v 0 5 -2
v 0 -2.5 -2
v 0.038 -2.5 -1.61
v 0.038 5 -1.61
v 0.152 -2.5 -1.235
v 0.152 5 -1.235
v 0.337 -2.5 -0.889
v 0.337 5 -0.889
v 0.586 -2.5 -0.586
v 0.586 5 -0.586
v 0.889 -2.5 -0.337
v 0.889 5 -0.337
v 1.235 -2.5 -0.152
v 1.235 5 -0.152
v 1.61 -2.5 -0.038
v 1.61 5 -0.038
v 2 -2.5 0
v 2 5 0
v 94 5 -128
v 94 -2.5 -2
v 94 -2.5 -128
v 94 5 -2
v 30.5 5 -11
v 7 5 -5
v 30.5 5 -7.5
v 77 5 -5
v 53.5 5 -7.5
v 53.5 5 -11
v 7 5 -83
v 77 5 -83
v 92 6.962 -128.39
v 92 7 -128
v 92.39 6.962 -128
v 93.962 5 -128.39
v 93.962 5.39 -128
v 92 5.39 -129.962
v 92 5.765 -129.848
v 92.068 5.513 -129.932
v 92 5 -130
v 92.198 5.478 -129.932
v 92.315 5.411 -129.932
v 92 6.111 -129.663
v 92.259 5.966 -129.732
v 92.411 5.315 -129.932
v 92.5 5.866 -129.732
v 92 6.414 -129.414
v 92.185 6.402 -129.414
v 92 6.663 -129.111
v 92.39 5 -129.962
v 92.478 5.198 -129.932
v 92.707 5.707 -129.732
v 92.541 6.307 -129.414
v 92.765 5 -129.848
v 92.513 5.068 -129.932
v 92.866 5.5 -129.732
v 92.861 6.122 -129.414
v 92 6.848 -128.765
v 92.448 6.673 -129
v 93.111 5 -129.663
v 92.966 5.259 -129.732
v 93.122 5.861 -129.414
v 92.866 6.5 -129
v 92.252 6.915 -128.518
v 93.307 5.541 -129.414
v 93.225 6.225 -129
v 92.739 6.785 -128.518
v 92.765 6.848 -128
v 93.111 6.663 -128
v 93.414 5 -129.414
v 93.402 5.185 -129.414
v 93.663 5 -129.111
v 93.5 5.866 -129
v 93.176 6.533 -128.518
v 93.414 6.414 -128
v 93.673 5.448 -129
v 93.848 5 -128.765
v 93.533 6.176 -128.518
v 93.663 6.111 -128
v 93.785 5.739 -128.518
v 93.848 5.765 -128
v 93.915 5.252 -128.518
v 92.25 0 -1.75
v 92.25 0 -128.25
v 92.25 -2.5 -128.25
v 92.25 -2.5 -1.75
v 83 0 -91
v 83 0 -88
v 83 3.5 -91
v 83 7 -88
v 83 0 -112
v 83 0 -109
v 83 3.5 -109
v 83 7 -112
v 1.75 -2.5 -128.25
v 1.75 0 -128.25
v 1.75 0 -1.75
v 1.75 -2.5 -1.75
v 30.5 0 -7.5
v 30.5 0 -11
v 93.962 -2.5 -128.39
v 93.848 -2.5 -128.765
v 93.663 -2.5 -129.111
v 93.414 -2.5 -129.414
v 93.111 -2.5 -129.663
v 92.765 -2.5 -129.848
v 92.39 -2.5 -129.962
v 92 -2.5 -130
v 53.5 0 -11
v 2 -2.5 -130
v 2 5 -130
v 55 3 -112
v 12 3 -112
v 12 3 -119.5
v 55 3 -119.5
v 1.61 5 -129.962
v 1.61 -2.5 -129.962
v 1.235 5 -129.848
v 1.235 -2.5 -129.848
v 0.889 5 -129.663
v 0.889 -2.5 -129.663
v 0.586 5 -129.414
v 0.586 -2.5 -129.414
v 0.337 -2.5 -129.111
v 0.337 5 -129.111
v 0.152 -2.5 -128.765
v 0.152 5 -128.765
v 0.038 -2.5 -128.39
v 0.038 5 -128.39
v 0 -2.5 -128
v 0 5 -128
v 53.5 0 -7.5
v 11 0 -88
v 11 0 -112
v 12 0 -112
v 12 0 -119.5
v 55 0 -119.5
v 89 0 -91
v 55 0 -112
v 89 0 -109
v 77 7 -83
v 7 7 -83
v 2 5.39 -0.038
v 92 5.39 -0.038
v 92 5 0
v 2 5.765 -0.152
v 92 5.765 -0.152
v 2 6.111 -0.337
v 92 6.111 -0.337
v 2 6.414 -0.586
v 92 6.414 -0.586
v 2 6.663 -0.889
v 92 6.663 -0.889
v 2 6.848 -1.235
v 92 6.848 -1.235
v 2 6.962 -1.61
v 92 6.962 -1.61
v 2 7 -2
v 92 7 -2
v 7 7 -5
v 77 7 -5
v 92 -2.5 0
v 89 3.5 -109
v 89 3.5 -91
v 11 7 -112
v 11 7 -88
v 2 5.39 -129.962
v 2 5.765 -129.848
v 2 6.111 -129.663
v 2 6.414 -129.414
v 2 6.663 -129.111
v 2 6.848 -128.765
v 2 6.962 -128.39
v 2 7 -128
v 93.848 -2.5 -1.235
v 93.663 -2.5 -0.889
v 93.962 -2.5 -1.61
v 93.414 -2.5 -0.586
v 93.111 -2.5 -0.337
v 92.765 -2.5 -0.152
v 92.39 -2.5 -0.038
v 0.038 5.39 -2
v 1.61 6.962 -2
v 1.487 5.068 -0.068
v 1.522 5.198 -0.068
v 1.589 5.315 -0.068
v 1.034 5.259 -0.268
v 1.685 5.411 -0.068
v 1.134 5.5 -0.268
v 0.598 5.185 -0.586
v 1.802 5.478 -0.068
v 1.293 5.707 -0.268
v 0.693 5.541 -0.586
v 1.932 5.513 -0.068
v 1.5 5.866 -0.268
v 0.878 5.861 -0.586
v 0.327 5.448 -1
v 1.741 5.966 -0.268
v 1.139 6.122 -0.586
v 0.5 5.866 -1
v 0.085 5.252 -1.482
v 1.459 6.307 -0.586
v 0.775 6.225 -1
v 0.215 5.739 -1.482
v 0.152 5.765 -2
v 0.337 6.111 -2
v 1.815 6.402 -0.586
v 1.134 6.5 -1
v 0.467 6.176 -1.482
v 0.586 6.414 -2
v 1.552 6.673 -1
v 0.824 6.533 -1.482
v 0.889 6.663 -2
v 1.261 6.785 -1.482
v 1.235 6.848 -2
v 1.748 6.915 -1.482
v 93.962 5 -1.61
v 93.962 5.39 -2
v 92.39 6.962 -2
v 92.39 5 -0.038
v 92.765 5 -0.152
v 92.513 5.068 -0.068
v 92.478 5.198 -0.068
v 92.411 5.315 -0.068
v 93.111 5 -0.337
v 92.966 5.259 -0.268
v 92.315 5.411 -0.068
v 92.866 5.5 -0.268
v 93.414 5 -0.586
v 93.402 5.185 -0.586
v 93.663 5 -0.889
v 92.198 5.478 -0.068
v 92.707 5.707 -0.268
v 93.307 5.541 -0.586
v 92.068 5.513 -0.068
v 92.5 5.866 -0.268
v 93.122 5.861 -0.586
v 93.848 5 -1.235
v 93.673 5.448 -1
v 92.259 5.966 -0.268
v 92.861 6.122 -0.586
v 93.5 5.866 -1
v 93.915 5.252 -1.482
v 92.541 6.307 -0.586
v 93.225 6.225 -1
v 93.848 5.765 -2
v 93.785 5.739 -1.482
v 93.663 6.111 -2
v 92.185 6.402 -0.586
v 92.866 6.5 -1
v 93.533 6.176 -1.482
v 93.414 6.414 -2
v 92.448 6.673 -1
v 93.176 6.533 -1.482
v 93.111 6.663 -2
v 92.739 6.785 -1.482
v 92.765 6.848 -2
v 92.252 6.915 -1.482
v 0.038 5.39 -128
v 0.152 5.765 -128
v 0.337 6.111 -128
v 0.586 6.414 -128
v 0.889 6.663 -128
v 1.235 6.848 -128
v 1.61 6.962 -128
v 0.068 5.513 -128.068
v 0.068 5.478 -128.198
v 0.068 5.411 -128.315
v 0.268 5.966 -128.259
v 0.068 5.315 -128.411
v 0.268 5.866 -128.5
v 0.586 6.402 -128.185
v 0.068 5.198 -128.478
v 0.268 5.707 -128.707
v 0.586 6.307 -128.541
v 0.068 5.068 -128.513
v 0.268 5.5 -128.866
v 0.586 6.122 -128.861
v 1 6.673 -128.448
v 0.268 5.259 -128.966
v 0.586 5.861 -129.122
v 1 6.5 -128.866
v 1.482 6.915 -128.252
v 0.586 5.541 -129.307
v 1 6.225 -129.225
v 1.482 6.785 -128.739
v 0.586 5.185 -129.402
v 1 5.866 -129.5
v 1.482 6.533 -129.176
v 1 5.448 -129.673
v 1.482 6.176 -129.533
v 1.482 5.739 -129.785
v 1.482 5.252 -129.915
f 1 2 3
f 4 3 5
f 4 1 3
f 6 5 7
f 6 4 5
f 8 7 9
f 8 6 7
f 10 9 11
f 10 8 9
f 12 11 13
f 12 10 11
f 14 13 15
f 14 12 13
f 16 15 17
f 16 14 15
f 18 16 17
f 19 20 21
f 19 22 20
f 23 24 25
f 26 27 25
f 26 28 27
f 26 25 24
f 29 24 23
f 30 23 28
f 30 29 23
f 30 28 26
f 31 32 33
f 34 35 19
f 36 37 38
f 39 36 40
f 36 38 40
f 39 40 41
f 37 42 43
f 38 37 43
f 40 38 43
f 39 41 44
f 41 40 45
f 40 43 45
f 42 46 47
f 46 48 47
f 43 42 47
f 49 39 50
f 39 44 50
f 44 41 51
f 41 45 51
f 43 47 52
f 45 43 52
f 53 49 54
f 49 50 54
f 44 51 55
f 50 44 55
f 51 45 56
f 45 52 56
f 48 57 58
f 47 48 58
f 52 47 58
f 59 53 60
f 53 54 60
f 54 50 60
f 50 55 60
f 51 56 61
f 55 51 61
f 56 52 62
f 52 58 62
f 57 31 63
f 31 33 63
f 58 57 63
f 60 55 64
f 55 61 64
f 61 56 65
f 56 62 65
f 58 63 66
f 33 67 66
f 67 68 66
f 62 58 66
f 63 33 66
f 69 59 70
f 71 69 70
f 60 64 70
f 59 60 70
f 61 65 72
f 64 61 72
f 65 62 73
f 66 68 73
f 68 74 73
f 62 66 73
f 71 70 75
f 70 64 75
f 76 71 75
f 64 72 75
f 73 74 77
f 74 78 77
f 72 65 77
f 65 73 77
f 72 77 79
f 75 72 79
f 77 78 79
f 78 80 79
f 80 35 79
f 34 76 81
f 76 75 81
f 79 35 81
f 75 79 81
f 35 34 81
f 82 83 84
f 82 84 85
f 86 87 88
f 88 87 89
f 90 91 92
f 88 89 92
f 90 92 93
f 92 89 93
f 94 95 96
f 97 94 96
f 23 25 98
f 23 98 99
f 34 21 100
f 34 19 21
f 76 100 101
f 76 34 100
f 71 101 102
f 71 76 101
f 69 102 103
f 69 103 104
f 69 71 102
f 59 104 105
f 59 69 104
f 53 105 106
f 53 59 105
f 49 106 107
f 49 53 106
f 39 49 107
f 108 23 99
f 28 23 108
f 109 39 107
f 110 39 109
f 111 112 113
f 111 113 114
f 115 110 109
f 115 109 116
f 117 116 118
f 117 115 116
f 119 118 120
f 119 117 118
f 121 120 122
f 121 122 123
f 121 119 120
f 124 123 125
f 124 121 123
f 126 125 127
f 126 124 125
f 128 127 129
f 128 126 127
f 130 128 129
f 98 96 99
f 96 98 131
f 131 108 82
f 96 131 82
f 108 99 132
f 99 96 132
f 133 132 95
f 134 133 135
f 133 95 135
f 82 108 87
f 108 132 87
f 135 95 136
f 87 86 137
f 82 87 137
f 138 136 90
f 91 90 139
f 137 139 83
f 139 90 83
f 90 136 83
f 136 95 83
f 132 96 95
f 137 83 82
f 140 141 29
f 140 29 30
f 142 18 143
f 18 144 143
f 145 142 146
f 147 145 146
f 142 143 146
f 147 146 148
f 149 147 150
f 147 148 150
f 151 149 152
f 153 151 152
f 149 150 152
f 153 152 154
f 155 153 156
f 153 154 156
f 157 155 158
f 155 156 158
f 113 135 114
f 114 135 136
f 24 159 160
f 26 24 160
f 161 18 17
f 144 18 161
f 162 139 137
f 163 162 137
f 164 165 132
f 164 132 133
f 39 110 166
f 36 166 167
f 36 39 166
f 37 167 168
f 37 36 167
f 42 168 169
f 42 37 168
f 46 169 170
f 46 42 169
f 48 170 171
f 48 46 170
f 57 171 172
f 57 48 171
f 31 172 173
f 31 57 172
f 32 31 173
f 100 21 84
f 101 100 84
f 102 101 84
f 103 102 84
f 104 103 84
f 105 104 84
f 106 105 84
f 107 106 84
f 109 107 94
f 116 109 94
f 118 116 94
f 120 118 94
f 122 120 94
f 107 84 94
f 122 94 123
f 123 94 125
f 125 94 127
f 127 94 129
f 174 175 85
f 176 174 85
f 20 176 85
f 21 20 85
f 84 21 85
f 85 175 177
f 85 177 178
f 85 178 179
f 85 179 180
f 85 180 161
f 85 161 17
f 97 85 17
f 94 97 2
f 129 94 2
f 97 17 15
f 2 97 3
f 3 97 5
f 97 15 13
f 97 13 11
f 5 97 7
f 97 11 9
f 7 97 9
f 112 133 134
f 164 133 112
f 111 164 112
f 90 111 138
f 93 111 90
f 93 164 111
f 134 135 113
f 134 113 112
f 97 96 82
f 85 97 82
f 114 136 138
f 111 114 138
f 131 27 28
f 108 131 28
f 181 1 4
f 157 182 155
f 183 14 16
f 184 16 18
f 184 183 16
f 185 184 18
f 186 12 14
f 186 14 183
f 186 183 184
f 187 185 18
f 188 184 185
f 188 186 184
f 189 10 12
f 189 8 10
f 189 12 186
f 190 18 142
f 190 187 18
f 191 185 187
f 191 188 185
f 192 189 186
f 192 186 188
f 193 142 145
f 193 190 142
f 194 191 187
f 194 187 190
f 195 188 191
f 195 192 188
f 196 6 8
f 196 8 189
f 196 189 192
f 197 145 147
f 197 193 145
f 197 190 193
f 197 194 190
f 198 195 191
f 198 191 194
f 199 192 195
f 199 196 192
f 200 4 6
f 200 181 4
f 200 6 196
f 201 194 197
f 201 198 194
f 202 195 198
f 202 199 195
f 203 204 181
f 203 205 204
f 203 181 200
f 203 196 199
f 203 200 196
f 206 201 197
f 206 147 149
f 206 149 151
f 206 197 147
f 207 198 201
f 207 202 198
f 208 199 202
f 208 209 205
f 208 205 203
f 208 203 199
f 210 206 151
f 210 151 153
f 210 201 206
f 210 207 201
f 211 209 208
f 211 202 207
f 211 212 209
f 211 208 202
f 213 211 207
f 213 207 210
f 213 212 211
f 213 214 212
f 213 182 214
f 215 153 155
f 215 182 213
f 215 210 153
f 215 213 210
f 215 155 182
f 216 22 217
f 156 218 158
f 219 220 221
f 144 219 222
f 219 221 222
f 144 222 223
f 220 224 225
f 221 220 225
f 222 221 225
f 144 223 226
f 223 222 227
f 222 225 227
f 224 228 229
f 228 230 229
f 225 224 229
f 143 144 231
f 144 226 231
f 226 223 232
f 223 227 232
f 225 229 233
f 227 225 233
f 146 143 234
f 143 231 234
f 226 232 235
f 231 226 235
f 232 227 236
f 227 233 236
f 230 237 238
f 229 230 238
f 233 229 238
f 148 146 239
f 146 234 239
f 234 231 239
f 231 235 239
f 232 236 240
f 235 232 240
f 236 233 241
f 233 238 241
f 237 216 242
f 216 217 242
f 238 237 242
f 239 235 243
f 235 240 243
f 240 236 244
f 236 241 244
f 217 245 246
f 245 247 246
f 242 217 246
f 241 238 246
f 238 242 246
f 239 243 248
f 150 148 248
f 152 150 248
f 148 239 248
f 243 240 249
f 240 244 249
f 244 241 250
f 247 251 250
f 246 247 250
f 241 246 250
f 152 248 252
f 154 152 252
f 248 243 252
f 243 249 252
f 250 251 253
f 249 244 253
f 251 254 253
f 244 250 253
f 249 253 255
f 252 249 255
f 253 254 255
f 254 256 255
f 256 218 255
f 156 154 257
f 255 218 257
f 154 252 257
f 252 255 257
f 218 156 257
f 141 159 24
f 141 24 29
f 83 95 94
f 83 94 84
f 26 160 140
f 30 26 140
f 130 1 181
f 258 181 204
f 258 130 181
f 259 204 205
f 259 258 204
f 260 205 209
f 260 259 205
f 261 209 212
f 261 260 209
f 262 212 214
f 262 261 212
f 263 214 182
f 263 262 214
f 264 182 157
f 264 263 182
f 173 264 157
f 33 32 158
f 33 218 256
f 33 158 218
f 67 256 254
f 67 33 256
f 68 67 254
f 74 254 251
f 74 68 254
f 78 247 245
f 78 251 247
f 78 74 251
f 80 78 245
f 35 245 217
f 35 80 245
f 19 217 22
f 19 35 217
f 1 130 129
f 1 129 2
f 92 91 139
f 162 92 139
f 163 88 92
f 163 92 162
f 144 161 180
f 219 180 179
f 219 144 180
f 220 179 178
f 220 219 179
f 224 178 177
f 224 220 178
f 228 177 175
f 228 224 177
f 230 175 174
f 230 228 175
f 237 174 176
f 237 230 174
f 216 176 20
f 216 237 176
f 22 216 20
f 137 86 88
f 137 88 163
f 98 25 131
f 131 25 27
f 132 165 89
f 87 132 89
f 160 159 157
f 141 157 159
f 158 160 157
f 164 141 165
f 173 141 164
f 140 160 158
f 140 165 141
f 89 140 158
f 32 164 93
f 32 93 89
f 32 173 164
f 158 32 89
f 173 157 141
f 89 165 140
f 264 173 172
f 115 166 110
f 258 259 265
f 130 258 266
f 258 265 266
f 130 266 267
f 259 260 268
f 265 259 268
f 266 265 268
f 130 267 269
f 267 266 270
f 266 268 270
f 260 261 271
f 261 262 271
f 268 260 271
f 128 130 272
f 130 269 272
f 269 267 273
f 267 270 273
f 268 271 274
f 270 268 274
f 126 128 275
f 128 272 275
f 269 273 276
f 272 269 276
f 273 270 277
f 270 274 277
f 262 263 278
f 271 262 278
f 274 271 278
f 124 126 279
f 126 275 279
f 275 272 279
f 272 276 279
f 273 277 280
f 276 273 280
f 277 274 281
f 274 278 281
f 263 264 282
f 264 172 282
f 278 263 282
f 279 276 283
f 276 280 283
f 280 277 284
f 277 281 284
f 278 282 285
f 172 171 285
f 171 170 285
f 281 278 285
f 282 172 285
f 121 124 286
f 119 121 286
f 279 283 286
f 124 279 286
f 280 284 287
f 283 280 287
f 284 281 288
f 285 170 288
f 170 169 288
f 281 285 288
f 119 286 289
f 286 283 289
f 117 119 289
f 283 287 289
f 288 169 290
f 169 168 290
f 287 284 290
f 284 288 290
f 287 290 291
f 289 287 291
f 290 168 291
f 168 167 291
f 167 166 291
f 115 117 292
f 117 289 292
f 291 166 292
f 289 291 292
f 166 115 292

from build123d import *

# Parameters (mm, degrees)
SKETCH1_W           = 94
SKETCH1_H           = 130
BOSS_EXTRUDE1_DEPTH = 7
SKETCH2_W           = 72
SKETCH2_H           = 24
CUT_EXTRUDE1_DEPTH  = 8
SKETCH3_W           = 6
SKETCH3_H           = 18
CUT_EXTRUDE2_DEPTH  = 3.5
SKETCH4_W           = 43
SKETCH4_H           = 7.5
CUT_EXTRUDE3_DEPTH  = 3
SKETCH5_W           = 70
SKETCH5_H           = 78
CUT_EXTRUDE4_DEPTH  = 2
SKETCH6_W           = 23
SKETCH6_H           = 3.5
CUT_EXTRUDE5_DEPTH  = 6
FILLET1_R           = 2
SKETCH8_W           = 90.5
SKETCH8_H           = 126.5
BOSS_EXTRUDE2_DEPTH = 2.5


with BuildPart() as part:
    # Sketch1 → Boss-Extrude1 (new body)
    with BuildSketch(Plane(origin=(0, 0, 0), x_dir=(1, 0, 0), z_dir=(0, 1, 0))):
        with Locations((47, 65)):
            Rectangle(SKETCH1_W, SKETCH1_H)
    extrude(amount=BOSS_EXTRUDE1_DEPTH)

    # Sketch2 → Cut-Extrude1 (cut, through all)
    with BuildSketch(Plane(origin=(0, 7, 0), x_dir=(1, 0, 0), z_dir=(0, 1, 0))):
        with Locations((47, 100)):
            Rectangle(SKETCH2_W, SKETCH2_H)
    extrude(amount=-CUT_EXTRUDE1_DEPTH, mode=Mode.SUBTRACT)

    # Sketch3 → Cut-Extrude2 (cut)
    with BuildSketch(Plane.XZ):
        with Locations((86, -100)):
            Rectangle(SKETCH3_W, SKETCH3_H)
    extrude(amount=-CUT_EXTRUDE2_DEPTH, mode=Mode.SUBTRACT)

    # Sketch4 → Cut-Extrude3 (cut)
    with BuildSketch(Plane.XZ):
        with Locations((33.5, -115.75)):
            Rectangle(SKETCH4_W, SKETCH4_H)
    extrude(amount=-CUT_EXTRUDE3_DEPTH, mode=Mode.SUBTRACT)

    # Sketch5 → Cut-Extrude4 (cut)
    with BuildSketch(Plane(origin=(0, 7, 0), x_dir=(1, 0, 0), z_dir=(0, 1, 0))):
        with Locations((42, 44)):
            Rectangle(SKETCH5_W, SKETCH5_H)
    extrude(amount=-CUT_EXTRUDE4_DEPTH, mode=Mode.SUBTRACT)

    # Sketch6 → Cut-Extrude5 (cut, through all)
    with BuildSketch(Plane(origin=(0, 5, 0), x_dir=(1, 0, 0), z_dir=(0, 1, 0))):
        with Locations((42, 9.25)):
            Rectangle(SKETCH6_W, SKETCH6_H)
    extrude(amount=-CUT_EXTRUDE5_DEPTH, mode=Mode.SUBTRACT)

    # Fillet1
    fillet1_edges = [part.edges().sort_by_distance(p)[0] for p in [
        (94, 7, -65),
        (47, 7, -130),
        (0, 7, -65),
        (0, 3.5, -130),
        (94, 3.5, -130),
        (94, 3.5, 0),
        (0, 3.5, 0),
        (47, 7, 0),
    ]]
    fillet(fillet1_edges, radius=FILLET1_R)

    # Sketch8 → Boss-Extrude2 (add)
    with BuildSketch(Plane.XZ):
        with BuildLine():
            Line((92, -130), (2, -130))
            ThreePointArc((2, -130), (0.585786438, -129.414213562), (0, -128))
            Line((0, -128), (0, -2))
            ThreePointArc((0, -2), (0.585786438, -0.585786438), (2, 0))
            Line((2, 0), (92, 0))
            ThreePointArc((92, 0), (93.414213562, -0.585786438), (94, -2))
            Line((94, -2), (94, -128))
            ThreePointArc((94, -128), (93.414213562, -129.414213562), (92, -130))
        make_face()
        with Locations((47, -65)):
            Rectangle(SKETCH8_W, SKETCH8_H, mode=Mode.SUBTRACT)
    extrude(amount=BOSS_EXTRUDE2_DEPTH)


solid = part.part
